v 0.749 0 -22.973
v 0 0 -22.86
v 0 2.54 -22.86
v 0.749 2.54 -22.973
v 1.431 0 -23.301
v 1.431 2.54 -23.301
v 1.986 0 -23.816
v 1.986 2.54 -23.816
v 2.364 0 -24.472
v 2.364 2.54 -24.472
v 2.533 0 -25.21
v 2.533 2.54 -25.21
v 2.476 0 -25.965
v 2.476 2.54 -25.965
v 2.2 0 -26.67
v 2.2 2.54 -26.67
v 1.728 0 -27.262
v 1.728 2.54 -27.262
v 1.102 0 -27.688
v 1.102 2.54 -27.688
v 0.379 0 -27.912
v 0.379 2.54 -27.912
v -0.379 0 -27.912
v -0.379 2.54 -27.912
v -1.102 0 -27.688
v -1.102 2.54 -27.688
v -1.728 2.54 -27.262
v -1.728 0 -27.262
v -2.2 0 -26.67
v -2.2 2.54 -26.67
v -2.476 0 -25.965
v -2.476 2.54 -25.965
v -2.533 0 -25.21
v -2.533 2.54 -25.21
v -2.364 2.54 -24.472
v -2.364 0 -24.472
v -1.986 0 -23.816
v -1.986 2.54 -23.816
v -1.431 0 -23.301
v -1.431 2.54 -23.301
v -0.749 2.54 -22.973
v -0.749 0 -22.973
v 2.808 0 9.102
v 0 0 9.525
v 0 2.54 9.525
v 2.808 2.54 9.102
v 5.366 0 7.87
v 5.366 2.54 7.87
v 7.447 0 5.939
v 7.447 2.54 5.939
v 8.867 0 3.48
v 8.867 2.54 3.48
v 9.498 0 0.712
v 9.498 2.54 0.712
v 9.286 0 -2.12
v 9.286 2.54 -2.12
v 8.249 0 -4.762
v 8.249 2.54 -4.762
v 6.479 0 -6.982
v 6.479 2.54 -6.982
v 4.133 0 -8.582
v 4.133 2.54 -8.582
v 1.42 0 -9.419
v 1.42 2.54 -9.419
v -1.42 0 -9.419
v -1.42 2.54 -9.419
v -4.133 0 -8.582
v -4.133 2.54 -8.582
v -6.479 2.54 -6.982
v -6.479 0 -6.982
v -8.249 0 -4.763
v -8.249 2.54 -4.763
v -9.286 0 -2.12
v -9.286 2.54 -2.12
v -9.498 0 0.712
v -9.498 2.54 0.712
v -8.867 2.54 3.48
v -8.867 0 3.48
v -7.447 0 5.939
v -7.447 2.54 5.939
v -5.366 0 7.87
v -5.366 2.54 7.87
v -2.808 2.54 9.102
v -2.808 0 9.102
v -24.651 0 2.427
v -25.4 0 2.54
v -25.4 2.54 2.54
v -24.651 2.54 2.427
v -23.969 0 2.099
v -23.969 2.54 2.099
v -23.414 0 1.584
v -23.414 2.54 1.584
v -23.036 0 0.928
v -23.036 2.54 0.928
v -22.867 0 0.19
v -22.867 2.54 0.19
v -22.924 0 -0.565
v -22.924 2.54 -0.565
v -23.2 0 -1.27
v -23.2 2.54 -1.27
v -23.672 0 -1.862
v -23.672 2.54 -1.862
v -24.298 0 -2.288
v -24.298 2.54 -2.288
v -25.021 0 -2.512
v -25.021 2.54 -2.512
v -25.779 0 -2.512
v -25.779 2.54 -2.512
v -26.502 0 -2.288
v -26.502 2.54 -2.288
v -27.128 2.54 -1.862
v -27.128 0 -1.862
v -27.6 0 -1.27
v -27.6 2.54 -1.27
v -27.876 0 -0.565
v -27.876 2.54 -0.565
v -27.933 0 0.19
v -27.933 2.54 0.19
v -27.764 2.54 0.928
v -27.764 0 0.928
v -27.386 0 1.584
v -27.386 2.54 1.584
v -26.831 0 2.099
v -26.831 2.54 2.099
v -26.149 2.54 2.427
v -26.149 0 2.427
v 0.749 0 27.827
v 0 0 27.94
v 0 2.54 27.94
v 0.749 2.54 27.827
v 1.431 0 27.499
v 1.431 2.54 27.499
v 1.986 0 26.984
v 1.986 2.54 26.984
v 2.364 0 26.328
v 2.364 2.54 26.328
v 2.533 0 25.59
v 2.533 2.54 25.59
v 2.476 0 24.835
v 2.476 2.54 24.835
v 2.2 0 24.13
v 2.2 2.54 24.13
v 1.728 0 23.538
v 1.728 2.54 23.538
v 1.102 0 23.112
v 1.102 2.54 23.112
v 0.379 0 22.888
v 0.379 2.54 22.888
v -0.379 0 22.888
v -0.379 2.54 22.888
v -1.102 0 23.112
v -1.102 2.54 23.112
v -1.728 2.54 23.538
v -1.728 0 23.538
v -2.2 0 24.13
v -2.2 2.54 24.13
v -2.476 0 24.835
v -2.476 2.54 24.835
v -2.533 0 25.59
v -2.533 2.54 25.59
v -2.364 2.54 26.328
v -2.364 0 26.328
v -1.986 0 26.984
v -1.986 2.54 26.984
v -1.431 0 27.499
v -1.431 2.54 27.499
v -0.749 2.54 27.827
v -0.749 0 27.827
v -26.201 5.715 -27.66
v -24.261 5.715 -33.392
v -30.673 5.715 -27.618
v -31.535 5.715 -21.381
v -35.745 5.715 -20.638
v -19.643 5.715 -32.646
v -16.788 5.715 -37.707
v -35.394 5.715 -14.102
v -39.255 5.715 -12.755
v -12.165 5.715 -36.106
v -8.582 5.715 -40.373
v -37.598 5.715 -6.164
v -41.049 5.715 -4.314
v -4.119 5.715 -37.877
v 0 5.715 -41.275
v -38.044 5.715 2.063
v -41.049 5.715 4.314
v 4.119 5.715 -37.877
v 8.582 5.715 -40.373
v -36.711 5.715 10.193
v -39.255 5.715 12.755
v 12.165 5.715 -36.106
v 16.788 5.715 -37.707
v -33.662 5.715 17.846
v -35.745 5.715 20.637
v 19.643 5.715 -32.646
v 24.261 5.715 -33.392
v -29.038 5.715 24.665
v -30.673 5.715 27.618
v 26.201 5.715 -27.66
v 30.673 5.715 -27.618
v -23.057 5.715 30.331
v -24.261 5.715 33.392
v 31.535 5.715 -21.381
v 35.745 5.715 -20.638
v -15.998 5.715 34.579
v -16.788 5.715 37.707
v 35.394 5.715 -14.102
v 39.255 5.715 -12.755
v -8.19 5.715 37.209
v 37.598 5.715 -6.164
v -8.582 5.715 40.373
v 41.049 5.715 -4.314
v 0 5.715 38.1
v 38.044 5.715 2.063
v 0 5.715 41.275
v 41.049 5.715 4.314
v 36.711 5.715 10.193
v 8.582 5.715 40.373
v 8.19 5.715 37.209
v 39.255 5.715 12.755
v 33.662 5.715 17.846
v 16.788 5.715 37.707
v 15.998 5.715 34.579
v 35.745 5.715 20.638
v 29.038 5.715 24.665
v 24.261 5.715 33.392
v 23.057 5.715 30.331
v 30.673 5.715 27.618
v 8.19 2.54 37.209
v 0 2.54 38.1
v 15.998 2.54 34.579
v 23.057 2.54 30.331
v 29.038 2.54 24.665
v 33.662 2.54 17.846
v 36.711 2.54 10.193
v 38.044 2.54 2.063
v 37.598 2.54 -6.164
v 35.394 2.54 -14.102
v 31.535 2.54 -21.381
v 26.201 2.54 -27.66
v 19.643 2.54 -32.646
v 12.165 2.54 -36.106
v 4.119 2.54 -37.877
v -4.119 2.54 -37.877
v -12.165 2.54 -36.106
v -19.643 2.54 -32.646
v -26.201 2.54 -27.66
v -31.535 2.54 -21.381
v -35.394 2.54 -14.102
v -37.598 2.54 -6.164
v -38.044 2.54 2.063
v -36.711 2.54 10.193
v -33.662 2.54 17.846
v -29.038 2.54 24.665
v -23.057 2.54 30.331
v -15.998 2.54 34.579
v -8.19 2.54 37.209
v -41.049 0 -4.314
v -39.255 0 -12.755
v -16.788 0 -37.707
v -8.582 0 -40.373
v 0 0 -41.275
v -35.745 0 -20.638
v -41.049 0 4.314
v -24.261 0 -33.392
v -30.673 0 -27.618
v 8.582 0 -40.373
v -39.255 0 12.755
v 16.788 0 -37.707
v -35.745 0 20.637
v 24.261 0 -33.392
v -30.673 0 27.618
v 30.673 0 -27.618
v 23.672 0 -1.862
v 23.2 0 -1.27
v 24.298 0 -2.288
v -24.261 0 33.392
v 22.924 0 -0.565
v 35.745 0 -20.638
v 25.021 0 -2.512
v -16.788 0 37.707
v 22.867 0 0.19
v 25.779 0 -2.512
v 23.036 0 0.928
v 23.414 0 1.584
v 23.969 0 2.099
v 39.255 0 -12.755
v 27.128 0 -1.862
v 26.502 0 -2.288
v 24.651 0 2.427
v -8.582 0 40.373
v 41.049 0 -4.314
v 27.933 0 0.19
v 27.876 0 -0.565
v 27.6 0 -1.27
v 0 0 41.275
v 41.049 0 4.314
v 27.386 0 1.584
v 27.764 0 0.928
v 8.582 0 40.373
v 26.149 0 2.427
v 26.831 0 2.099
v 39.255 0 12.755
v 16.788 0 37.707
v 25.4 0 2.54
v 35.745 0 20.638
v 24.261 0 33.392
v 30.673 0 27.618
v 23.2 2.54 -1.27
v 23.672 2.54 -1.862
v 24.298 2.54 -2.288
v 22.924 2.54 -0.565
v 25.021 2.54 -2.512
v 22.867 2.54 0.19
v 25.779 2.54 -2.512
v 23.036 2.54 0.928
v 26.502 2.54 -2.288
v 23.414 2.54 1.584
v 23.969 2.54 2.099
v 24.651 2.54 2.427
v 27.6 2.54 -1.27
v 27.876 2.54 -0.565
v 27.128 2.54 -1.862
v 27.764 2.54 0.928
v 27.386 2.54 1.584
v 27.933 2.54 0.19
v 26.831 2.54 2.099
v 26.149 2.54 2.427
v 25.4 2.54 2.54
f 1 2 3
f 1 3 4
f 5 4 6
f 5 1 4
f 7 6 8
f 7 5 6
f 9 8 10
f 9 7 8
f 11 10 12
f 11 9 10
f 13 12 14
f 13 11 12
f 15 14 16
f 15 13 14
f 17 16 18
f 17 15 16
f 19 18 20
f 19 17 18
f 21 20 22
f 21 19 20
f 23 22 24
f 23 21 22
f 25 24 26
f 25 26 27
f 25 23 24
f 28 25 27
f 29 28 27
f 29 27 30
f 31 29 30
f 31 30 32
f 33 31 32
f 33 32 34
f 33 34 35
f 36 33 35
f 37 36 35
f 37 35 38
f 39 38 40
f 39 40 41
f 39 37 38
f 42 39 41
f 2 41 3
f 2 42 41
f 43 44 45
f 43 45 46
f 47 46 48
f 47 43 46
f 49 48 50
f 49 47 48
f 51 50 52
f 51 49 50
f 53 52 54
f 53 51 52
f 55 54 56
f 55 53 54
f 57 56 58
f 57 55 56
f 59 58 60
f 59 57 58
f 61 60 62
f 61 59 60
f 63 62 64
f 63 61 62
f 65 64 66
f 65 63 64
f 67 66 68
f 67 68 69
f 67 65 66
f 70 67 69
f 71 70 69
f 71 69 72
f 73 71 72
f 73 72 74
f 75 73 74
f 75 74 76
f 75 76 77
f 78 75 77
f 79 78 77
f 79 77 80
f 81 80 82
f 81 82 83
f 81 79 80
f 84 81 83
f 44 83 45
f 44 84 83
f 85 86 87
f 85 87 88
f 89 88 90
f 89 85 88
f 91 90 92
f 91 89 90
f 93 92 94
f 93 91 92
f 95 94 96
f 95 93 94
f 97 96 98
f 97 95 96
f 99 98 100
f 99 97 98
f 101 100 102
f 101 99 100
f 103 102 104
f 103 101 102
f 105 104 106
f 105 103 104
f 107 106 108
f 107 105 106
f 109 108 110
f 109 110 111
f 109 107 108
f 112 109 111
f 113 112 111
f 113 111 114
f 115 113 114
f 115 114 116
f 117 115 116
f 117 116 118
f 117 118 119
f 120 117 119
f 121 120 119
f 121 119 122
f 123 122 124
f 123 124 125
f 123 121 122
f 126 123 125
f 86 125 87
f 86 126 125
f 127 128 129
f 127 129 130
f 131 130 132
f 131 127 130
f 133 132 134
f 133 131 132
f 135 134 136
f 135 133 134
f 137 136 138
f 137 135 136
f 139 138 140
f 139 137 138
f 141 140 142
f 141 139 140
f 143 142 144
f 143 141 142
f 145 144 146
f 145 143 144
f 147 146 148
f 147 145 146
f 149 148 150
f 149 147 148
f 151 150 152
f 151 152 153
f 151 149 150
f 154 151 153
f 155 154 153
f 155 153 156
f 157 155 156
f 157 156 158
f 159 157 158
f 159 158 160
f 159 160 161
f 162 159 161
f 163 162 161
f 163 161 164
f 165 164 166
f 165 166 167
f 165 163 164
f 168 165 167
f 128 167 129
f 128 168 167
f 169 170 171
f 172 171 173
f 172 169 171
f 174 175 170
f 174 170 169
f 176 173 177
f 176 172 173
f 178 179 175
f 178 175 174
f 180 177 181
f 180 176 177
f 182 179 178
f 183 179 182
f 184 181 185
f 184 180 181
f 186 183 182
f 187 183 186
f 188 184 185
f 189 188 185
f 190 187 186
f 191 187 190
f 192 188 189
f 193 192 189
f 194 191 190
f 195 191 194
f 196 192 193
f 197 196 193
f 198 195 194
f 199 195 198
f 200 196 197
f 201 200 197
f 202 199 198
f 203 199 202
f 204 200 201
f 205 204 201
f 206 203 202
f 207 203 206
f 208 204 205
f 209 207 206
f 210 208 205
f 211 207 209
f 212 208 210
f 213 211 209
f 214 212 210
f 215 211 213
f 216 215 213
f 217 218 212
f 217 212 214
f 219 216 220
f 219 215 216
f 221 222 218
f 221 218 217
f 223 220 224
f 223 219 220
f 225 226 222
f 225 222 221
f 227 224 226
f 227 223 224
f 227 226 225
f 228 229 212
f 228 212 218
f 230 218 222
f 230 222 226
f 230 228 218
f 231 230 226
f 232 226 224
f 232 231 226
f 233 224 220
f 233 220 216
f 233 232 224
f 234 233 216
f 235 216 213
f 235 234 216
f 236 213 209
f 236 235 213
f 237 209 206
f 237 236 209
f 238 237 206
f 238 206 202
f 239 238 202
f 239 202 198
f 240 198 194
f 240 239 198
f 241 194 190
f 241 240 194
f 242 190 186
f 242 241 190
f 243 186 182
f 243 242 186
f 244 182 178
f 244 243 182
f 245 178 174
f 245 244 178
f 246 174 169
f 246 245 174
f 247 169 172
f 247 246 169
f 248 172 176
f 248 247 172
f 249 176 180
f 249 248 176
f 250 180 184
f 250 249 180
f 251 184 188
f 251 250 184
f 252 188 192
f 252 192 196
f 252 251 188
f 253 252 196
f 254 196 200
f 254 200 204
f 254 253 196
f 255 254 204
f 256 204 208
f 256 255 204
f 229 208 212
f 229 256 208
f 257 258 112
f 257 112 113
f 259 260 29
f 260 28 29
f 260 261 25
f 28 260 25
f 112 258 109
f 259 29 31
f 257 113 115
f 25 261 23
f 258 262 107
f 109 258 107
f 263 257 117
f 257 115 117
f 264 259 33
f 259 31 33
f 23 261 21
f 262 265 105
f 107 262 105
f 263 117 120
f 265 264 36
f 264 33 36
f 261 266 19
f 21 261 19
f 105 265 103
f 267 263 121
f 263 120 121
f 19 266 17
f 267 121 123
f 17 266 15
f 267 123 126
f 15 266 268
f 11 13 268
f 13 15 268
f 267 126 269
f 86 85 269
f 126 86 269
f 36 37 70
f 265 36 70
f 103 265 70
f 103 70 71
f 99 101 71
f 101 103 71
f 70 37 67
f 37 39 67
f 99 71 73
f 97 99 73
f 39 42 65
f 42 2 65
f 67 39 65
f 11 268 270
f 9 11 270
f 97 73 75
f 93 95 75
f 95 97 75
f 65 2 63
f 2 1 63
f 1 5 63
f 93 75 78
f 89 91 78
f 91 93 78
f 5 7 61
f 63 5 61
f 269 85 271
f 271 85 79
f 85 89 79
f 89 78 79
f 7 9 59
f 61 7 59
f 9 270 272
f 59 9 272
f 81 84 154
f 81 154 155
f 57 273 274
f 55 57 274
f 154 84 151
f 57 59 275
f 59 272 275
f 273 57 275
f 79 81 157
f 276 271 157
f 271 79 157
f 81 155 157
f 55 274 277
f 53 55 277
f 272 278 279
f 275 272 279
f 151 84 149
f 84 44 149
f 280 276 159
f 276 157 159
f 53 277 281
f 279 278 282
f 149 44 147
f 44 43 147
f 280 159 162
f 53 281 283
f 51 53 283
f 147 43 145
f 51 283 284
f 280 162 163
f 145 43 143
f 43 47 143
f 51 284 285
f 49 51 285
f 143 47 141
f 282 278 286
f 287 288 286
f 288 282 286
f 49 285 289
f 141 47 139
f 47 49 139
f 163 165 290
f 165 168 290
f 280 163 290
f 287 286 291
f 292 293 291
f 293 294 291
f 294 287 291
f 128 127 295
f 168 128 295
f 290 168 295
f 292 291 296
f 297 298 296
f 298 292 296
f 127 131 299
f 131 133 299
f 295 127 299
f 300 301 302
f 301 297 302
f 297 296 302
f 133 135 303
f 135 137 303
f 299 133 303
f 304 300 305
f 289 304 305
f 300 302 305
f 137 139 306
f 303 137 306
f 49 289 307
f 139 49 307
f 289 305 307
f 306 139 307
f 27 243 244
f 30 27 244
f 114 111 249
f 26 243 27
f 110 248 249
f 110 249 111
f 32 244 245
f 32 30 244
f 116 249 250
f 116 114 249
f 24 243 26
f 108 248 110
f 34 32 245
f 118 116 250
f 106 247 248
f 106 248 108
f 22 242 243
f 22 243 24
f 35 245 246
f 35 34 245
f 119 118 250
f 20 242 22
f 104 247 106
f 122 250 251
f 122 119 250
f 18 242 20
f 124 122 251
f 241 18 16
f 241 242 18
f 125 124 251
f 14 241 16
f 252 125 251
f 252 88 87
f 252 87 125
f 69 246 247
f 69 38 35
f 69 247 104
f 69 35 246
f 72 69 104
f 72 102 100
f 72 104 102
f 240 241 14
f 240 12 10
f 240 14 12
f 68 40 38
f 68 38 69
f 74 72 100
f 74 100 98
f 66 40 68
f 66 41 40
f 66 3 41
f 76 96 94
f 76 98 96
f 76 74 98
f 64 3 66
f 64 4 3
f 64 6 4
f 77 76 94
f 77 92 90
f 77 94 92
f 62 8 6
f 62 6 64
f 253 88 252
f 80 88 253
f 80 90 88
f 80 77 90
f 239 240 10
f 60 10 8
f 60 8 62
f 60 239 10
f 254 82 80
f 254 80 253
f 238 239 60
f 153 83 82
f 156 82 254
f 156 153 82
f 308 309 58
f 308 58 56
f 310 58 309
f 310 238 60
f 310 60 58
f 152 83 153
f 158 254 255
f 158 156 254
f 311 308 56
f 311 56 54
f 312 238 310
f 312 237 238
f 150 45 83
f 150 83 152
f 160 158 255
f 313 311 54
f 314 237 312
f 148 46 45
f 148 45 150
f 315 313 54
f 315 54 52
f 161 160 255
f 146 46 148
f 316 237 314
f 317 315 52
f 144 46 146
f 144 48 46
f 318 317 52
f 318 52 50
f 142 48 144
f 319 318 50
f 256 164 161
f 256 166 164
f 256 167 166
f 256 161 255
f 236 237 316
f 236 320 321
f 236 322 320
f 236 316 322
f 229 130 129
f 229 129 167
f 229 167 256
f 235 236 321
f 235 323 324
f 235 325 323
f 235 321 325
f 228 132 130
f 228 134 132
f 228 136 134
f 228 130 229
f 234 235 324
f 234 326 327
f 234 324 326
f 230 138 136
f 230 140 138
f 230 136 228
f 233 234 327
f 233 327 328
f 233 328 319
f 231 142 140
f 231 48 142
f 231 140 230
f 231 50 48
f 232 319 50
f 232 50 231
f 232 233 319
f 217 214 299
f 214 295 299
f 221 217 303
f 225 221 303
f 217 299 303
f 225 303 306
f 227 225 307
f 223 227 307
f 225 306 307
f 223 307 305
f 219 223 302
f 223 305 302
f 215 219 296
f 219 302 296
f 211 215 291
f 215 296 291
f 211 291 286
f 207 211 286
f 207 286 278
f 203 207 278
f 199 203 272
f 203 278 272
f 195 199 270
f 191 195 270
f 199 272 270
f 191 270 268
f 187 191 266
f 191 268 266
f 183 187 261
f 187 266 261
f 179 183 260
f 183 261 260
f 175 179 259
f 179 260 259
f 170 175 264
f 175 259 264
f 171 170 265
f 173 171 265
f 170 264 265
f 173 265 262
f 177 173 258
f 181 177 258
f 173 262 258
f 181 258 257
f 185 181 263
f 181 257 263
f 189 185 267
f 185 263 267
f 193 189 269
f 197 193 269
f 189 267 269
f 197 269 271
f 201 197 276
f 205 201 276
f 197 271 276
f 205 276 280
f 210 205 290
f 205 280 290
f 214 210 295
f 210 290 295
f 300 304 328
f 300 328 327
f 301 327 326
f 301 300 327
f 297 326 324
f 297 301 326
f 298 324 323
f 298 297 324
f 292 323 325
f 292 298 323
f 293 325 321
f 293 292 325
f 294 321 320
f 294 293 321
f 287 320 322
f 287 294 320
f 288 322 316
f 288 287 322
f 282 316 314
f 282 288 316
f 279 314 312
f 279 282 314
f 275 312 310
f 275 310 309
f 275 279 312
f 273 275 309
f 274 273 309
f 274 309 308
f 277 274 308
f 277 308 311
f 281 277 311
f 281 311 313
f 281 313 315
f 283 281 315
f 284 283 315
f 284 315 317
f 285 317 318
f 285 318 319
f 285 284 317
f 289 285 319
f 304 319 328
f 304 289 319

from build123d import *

# Parameters (mm, degrees)
SKETCH1_R        = 41.275
SKETCH1_R_2      = 38.1
SKETCH1_R_3      = 2.54
SKETCH1_R_4      = 9.525
BASE_DEPTH       = 2.54
SKETCH2_R        = 41.275
SKETCH2_R_2      = 38.1
FRONT_WALL_DEPTH = 3.175


with BuildPart() as part:
    # Sketch1 → base (new body)
    with BuildSketch(Plane(origin=(0, 0, 0), x_dir=(1, 0, 0), z_dir=(0, 1, 0))):
        with Locations(Location((0, 0, 0), (0, 0, 270))):
            Circle(SKETCH1_R)
        Circle(SKETCH1_R_2, mode=Mode.SUBTRACT)
        Circle(SKETCH1_R_2)
        with Locations(Location((-25.4, 0, 0), (0, 0, 270))):
            Circle(SKETCH1_R_3, mode=Mode.SUBTRACT)
        with Locations(Location((0, -25.4, 0), (0, 0, 270))):
            Circle(SKETCH1_R_3, mode=Mode.SUBTRACT)
        with Locations(Location((25.4, 0, 0), (0, 0, 270))):
            Circle(SKETCH1_R_3, mode=Mode.SUBTRACT)
        with Locations(Location((0, 25.4, 0), (0, 0, 270))):
            Circle(SKETCH1_R_3, mode=Mode.SUBTRACT)
        with Locations(Location((0, 0, 0), (0, 0, 270))):
            Circle(SKETCH1_R_4, mode=Mode.SUBTRACT)
    extrude(amount=BASE_DEPTH)

    # Sketch2 → front wall (add)
    with BuildSketch(Plane(origin=(0, 2.54, 0), x_dir=(1, 0, 0), z_dir=(0, 1, 0))):
        with Locations(Location((0, 0, 0), (0, 0, 270))):
            Circle(SKETCH2_R)
        with Locations(Location((0, 0, 0), (0, 0, 270))):
            Circle(SKETCH2_R_2, mode=Mode.SUBTRACT)
    extrude(amount=FRONT_WALL_DEPTH)


solid = part.part
